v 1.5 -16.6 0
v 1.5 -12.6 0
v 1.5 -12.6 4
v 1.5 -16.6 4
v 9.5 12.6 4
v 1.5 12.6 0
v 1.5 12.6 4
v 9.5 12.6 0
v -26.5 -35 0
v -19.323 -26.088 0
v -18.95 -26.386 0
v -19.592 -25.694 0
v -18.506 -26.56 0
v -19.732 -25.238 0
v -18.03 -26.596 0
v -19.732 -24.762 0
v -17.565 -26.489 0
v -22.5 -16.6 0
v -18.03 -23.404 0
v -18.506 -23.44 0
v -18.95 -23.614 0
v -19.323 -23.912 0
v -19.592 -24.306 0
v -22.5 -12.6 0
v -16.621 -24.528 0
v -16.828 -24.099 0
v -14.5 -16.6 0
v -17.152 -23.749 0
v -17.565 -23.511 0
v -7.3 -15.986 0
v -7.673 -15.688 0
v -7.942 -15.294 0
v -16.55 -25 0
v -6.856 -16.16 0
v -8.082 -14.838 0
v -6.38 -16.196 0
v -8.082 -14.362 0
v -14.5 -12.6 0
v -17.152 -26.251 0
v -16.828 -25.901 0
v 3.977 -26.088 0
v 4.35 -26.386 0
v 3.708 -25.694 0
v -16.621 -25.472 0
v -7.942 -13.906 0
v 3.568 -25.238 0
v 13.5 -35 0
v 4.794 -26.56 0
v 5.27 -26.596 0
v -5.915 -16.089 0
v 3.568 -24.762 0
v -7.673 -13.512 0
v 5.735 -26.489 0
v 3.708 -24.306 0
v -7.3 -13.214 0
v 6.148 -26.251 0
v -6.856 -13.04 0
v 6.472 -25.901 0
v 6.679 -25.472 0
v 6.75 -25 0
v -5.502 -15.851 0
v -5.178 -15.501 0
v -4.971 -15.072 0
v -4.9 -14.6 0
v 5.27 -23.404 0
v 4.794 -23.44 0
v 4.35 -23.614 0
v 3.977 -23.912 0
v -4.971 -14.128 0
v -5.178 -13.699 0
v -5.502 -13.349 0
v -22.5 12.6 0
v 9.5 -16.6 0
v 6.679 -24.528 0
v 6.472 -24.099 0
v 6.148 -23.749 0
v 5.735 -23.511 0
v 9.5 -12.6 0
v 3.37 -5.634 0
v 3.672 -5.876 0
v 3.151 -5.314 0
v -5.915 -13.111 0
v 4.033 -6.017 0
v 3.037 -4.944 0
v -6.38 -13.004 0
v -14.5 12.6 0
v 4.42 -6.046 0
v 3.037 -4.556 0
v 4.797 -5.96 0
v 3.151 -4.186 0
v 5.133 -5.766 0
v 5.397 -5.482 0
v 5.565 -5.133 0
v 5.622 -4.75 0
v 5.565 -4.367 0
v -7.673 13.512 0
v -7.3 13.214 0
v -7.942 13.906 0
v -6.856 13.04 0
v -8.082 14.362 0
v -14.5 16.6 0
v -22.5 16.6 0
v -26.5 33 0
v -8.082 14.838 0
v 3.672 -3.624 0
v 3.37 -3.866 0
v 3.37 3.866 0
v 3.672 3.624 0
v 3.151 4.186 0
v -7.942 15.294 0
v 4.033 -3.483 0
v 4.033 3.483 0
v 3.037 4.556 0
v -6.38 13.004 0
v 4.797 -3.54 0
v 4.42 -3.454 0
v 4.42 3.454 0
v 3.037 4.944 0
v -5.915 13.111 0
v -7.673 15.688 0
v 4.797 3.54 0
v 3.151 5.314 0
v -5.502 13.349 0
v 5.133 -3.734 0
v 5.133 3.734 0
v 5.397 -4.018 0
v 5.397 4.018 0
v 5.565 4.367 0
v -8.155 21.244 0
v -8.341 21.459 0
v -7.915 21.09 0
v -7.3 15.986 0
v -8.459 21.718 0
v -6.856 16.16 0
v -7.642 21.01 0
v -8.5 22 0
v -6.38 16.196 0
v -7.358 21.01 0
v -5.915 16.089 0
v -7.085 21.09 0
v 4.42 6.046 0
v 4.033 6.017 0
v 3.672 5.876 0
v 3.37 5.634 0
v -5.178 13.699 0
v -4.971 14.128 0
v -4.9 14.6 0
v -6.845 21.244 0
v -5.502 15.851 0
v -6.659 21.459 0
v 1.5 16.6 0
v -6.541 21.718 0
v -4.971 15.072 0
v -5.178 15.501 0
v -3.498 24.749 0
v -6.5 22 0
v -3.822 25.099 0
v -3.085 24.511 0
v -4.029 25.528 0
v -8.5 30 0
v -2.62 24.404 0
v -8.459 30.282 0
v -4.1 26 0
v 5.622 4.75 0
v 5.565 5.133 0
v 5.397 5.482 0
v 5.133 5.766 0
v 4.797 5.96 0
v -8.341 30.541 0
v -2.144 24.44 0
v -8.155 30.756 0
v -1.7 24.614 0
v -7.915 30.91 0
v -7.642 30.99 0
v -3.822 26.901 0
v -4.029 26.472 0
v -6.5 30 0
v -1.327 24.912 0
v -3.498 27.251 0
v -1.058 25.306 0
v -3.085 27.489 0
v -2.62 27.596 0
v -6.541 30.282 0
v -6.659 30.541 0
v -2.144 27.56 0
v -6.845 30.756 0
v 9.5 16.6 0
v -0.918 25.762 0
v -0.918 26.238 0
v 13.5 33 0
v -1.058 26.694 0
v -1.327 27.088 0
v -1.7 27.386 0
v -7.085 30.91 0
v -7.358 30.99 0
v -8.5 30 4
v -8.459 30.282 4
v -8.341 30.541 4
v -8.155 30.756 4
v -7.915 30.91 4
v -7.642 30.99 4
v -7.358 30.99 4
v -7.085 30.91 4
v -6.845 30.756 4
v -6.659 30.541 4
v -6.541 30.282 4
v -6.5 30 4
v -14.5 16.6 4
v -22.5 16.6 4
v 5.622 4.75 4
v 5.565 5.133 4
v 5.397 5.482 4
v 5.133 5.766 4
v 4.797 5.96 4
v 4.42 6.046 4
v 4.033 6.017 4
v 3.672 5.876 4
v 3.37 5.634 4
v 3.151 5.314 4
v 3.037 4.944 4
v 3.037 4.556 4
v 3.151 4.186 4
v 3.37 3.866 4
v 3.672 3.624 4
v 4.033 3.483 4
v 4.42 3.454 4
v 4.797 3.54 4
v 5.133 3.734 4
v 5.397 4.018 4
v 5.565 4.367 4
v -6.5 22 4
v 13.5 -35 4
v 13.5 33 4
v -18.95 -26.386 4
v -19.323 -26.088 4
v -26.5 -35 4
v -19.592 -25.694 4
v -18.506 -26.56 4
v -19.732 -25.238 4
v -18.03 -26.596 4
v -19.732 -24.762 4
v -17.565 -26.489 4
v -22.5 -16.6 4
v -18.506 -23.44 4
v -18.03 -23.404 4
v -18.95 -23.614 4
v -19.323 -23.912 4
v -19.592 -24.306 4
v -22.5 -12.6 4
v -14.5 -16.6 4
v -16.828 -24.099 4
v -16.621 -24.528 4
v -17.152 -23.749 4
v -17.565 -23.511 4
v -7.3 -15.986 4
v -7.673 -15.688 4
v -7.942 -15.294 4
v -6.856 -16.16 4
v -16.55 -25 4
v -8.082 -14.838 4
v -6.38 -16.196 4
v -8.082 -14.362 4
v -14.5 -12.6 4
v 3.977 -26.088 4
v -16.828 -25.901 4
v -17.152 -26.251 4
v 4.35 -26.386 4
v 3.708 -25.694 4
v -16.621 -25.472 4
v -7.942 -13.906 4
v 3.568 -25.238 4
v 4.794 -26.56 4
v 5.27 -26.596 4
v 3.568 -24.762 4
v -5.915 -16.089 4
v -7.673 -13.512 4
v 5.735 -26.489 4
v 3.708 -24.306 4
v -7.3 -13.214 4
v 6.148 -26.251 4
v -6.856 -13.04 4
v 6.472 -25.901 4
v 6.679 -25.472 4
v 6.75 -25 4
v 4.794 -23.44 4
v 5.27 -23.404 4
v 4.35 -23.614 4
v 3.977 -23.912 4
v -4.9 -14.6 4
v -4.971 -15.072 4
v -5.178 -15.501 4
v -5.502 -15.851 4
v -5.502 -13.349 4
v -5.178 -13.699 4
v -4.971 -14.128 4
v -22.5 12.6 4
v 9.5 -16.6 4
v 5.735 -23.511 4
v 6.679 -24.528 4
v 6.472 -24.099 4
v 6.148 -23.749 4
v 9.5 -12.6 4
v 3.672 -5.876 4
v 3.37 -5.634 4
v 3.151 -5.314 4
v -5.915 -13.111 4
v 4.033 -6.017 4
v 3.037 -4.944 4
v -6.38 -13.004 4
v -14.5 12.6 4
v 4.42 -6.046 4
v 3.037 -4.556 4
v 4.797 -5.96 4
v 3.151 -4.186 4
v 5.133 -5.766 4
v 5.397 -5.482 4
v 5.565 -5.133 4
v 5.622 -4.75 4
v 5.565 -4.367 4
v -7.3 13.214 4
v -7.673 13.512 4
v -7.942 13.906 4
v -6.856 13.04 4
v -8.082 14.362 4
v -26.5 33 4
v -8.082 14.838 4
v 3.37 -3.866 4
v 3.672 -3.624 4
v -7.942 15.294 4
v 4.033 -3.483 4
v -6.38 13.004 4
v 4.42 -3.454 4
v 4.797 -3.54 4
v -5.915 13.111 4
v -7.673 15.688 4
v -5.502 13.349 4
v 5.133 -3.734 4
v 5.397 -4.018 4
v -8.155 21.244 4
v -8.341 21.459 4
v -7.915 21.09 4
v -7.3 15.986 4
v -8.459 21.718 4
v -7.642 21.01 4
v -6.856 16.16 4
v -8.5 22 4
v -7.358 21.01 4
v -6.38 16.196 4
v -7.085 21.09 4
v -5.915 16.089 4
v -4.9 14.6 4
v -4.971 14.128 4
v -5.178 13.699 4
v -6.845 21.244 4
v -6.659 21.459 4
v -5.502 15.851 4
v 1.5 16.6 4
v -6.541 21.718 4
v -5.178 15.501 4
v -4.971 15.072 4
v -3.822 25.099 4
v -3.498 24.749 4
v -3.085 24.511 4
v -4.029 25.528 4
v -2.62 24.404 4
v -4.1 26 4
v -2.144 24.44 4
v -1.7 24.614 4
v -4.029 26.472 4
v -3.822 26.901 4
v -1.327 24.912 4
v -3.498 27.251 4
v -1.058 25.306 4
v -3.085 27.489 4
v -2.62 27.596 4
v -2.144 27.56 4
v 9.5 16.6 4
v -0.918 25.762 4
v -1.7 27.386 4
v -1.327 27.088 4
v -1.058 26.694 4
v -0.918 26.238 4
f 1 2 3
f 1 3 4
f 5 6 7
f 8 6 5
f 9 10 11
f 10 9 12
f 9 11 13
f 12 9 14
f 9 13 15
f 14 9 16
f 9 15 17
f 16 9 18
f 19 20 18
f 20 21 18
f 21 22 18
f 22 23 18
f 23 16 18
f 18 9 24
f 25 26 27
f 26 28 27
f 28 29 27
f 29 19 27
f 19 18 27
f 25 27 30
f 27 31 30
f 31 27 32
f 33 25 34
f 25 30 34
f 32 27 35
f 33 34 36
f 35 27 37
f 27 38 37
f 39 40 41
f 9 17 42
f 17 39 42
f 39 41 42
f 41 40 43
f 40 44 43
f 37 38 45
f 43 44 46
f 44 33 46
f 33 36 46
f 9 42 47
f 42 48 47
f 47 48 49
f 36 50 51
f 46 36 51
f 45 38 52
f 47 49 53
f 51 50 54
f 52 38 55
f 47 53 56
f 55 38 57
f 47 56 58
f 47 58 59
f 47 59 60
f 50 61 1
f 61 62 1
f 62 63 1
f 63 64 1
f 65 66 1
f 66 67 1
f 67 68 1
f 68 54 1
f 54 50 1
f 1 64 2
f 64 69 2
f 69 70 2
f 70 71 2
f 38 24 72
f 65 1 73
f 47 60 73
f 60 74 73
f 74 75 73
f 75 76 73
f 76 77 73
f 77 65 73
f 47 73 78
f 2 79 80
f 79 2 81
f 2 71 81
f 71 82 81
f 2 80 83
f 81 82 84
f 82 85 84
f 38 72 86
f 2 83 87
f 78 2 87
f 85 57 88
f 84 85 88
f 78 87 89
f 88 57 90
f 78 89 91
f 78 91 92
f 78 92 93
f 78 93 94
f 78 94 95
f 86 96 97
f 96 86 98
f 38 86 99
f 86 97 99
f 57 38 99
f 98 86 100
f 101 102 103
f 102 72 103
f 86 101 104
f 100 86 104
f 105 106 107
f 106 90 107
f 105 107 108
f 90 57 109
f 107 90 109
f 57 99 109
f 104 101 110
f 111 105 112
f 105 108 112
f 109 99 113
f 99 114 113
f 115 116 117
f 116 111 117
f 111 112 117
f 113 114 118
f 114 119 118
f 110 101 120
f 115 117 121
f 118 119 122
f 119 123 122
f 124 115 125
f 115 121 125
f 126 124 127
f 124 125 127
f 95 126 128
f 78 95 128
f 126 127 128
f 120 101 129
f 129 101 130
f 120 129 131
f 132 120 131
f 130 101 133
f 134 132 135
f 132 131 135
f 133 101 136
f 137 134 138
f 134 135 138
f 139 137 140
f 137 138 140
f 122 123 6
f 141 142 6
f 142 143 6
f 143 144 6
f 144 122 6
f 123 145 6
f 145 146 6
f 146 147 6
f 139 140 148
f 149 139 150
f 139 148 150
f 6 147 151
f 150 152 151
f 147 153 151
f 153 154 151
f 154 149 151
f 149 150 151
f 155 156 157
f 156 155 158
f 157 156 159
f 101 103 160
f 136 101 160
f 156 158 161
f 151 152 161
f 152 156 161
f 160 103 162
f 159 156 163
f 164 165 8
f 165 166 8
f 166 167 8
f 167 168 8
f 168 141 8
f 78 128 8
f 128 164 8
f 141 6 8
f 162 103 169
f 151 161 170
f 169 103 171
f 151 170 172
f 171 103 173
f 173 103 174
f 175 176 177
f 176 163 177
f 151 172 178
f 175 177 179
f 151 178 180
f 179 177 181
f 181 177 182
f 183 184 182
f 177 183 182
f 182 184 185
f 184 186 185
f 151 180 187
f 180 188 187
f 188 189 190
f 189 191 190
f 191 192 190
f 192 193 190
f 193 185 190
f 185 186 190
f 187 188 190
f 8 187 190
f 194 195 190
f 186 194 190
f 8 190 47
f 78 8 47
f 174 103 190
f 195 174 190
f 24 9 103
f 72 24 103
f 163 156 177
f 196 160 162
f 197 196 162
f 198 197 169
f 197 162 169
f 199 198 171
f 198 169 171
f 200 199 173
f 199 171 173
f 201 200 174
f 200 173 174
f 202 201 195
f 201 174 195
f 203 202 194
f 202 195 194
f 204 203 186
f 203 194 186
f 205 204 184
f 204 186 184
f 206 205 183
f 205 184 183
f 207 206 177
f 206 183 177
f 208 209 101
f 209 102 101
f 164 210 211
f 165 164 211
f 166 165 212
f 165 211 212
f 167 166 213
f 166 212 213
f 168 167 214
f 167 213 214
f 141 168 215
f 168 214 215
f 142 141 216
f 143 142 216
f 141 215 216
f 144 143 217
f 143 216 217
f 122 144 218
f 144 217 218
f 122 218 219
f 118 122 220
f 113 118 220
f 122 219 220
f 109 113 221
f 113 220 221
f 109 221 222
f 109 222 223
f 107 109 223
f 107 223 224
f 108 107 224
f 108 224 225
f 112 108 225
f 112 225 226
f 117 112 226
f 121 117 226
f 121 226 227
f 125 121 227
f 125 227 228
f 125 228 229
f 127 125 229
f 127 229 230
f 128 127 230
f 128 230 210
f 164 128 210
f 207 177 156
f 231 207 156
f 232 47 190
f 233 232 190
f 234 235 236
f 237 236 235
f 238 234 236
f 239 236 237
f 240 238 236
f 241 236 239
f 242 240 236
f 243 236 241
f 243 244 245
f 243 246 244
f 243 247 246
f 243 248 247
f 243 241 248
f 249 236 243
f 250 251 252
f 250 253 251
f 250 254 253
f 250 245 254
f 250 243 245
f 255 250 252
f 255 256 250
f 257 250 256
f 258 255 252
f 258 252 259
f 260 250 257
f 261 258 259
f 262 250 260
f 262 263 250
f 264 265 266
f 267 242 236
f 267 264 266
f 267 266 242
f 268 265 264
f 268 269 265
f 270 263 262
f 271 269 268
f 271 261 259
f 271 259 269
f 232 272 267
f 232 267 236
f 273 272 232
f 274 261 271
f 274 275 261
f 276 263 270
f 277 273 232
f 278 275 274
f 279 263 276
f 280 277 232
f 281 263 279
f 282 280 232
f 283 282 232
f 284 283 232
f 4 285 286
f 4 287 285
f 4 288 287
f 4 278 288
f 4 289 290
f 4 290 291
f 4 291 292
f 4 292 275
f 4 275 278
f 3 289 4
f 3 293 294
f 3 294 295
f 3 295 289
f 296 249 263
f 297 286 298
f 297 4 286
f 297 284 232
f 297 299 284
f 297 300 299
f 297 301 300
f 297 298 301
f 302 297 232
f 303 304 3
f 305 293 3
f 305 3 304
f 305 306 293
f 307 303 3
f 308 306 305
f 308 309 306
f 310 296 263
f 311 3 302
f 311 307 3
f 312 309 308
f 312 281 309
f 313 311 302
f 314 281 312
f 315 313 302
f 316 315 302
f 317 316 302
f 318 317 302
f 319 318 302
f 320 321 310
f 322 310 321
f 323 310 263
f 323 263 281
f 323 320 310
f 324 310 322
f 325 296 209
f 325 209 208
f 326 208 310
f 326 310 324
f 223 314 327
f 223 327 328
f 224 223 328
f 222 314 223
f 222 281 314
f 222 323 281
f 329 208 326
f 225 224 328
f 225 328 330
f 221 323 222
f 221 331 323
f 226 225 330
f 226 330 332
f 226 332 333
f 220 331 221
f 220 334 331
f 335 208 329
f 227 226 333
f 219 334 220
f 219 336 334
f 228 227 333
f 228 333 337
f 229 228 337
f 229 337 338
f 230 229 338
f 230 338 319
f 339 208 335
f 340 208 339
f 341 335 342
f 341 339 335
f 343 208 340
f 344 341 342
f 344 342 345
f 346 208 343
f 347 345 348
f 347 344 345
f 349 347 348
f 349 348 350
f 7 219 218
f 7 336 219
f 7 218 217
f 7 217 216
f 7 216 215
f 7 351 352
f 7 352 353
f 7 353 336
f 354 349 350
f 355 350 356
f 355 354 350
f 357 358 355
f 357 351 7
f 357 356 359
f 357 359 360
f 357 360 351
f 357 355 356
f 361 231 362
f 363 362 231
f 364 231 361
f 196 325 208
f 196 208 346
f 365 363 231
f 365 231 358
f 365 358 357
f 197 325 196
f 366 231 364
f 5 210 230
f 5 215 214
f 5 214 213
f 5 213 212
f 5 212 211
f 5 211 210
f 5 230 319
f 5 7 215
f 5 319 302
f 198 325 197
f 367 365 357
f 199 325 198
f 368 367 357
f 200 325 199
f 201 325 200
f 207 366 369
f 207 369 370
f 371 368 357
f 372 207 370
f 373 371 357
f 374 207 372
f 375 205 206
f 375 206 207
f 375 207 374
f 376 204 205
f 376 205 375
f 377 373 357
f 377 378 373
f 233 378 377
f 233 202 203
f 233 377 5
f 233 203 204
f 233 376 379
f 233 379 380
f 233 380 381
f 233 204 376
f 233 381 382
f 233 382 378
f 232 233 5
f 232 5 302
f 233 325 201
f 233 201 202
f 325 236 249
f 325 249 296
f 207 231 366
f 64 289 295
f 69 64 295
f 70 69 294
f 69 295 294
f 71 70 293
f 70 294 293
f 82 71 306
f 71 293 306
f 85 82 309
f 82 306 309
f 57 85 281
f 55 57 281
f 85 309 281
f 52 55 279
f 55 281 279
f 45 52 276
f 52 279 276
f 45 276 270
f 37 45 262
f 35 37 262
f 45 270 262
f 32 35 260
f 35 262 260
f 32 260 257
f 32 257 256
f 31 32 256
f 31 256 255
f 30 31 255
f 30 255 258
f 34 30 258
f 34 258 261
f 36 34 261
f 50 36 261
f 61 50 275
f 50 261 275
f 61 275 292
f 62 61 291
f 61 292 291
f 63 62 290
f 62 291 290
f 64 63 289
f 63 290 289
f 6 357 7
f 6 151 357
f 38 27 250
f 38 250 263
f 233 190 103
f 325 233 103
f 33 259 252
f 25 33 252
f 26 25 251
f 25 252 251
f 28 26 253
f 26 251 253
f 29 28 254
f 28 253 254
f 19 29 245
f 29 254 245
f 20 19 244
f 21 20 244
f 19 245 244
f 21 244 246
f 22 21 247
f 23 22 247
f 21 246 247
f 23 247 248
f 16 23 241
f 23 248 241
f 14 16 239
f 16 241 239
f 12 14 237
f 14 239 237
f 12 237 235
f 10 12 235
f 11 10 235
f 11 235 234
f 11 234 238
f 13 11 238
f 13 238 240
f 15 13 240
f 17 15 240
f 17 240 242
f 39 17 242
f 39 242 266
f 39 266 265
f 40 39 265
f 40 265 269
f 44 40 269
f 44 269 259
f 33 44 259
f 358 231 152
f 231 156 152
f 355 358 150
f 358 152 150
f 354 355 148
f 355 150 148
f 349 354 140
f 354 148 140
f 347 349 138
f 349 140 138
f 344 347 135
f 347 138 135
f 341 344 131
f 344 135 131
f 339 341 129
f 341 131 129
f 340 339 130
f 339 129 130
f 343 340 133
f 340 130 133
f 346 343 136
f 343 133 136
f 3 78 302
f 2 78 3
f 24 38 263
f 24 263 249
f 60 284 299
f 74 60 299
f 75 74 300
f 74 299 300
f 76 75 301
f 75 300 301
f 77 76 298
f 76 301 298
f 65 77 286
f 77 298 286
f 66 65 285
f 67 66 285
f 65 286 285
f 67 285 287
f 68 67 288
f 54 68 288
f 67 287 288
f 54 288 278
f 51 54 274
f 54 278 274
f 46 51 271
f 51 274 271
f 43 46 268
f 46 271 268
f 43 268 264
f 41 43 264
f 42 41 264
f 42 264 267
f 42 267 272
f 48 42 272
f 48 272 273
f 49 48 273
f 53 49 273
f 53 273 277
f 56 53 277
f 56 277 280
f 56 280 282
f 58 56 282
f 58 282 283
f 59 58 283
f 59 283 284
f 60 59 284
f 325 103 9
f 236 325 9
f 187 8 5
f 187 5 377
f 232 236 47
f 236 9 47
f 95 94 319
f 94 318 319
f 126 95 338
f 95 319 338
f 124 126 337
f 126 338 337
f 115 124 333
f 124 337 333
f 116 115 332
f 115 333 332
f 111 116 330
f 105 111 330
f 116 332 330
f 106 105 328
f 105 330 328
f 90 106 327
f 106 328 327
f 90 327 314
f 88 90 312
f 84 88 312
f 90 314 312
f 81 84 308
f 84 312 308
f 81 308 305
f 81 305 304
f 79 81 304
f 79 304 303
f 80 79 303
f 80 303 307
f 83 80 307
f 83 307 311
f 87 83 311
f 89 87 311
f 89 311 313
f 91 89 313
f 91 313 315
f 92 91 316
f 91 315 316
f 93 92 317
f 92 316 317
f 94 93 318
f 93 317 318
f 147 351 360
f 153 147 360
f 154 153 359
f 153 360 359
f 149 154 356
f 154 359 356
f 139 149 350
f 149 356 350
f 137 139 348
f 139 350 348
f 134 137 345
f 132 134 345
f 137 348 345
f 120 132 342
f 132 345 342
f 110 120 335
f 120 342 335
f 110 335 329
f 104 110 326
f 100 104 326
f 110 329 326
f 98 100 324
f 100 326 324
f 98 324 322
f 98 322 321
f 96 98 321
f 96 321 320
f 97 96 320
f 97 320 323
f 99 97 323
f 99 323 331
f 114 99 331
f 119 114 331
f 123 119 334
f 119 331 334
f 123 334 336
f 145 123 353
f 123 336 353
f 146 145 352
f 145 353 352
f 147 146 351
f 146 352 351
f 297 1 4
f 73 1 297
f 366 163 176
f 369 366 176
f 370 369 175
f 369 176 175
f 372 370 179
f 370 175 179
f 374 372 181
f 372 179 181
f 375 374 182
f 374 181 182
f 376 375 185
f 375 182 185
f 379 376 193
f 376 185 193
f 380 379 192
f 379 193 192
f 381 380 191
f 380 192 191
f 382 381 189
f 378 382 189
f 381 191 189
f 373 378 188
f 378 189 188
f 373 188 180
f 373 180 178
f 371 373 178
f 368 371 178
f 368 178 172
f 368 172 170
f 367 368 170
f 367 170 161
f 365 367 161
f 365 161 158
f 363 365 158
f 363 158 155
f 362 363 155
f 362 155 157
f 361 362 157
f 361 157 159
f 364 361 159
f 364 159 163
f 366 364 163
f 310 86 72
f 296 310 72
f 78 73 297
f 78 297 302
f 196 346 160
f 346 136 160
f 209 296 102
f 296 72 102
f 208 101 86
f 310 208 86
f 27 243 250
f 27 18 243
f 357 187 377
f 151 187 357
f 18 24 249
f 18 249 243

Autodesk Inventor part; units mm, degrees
ref_plane "YZ Plane" through (0, 0, 0) normal (1, 0, 0) x (0, 1, 0)
ref_plane "XZ Plane" through (0, 0, 0) normal (0, 1, 0) x (-1, 0, 0)
ref_plane "XY Plane" through (0, 0, 0) normal (0, 0, 1) x (1, 0, 0)
sketch "Эскиз1" plane through (0, 0, 0) normal (0, 0, 1) x (1, 0, 0)
  line L0 (-26.5, -35) -> (13.5, -35)
  line L1 (13.5, -35) -> (13.5, 33)
  line L2 (13.5, 33) -> (-26.5, 33)
  line L3 (-26.5, 33) -> (-26.5, -35)
  line L4 (-22.5, -16.6) -> (-14.5, -16.6)
  line L5 (-14.5, -16.6) -> (-14.5, -12.6)
  line L6 (-14.5, -12.6) -> (-22.5, -12.6)
  line L7 (-22.5, -12.6) -> (-22.5, -16.6)
  line L8 (1.5, -16.6) -> (9.5, -16.6)
  line L9 (9.5, -16.6) -> (9.5, -12.6)
  line L10 (9.5, -12.6) -> (1.5, -12.6)
  line L11 (1.5, -12.6) -> (1.5, -16.6)
  line L12 (-22.5, 16.6) -> (-14.5, 16.6)
  line L13 (-14.5, 16.6) -> (-14.5, 12.6)
  line L14 (-14.5, 12.6) -> (-22.5, 12.6)
  line L15 (-22.5, 12.6) -> (-22.5, 16.6)
  line L16 (1.5, 12.6) -> (9.5, 12.6)
  line L17 (9.5, 12.6) -> (9.5, 16.6)
  line L18 (9.5, 16.6) -> (1.5, 16.6)
  line L19 (1.5, 16.6) -> (1.5, 12.6)
  line L20 (-18.5, -12.6) -> (-18.5, -3.7782) construction
  line L21 (5.5, -12.6) -> (5.5, -5.4201) construction
  point P0 (0, 0)
  point P1 (-14.5, -14.6)
  point P2 (1.5, -14.6)
  point P3 (5.5, 12.6)
  point P4 (-18.5, 12.6)
  dimension "d0" = 68
  dimension "d1" = 40
  dimension "d2" = 8
  dimension "d3" = 4
  dimension "d5" = 4
  dimension "d10" = 8
  dimension "d12" = 4
  dimension "d13" = 16
  dimension "d32" = 8
  dimension "d33" = 4
  dimension "d34" = 8
  dimension "d35" = 25.2
  dimension "d54" = 16.4
  dimension "d55" = 25.2
extrude "Выдавливание1" add sketch "Эскиз1" along normal blind 4
sketch "Эскиз3" plane through (0, 0, 4) normal (0, 0, 1) x (1, 0, 0)
  line L0 (1.5, -16.6) -> (1.5, -12.6) projected
  line L1 (-14.5, -12.6) -> (-14.5, -16.6) projected
  circle A0 centre (-6.5, 14.6) radius 1.6
  circle A1 centre (-6.5, -14.6) radius 1.6
  line L2 (-14.5, 14.6) -> (1.5, 14.6)
  line L3 (-14.5, -14.6) -> (1.5, -14.6)
  line L4 (-14.5, 16.6) -> (-14.5, 12.6) projected
  line L5 (1.5, 12.6) -> (1.5, 16.6) projected
  point P0 (0, 0)
  point P1 (-14.5, 14.6)
  point P2 (1.5, 14.6)
  dimension "d27" = 3.2
  dimension "d28" = 3.2
extrude "Выдавливание3" cut sketch "Эскиз3" against normal blind 4
sketch "Эскиз4" plane through (0, 0, 0) normal (0, 0, -1) x (-1, 0, 0)
  line L0 (-25.5, 33) -> (9.5, 33) construction
  line L1 (9.5, 33) -> (9.5, 19) construction
  line L2 (9.5, 19) -> (-25.5, 19) construction
  line L3 (-25.5, 19) -> (-25.5, 33) construction
  line L4 (-13.5, 33) -> (26.5, 33) projected
  line L5 (-13.5, -35) -> (-13.5, 33) projected
  circle A0 centre (2.5, 26) radius 1.6
  line L6 (7.5, 21) -> (7.5, 31) construction
  line L7 (8.5, 22) -> (8.5, 30)
  line L8 (6.5, 30) -> (6.5, 22)
  arc A1 (6.5, 22) -> (8.5, 22) centre (7.5, 22) ccw
  arc A2 (8.5, 30) -> (6.5, 30) centre (7.5, 30) ccw
  line L9 (9.5, 26) -> (-1.5724, 26)
  point P0 (0, 0)
  point P1 (-8, 33)
  point P2 (-25.5, 26)
  point P3 (7.5, 26)
  dimension "d39" = 35
  dimension "d40" = 14
  dimension "d41" = 12
  dimension "d42" = 3.2
  dimension "d43" = 7
  dimension "d44" = 10
  dimension "d45" = 2
  dimension "d46" = 5
extrude "Выдавливание4" cut sketch "Эскиз4" against normal blind 4
sketch "Эскиз5" plane through (0, 0, 4) normal (0, 0, 1) x (1, 0, 0)
  line L0 (4.3225, 4.75) -> (4.3225, -4.75)
  line L1 (0, 0) -> (13.5, 0) construction
  line L2 (13.5, -35) -> (13.5, 33) construction
  circle A0 centre (4.3225, 4.75) radius 1.3
  circle A1 centre (4.3225, -4.75) radius 1.3
  point P0 (4.3225, 0)
  dimension "d49" = 9.5
  dimension "d50" = 2.6
  dimension "d51" = 2.6
extrude "Выдавливание5" cut sketch "Эскиз5" against normal blind 4
sketch "Эскиз7" plane through (0, 0, 4) normal (0, 0, 1) x (1, 0, 0)
  line L0 (23.5, -19) -> (23.5, -23) construction
  line L1 (-19.8, -23) -> (-19.8, -27) construction
  line L2 (-19.8, -27) -> (-36.5, -27) construction
  line L3 (-36.5, -27) -> (-36.5, -23) construction
  line L4 (-36.5, -23) -> (-19.8, -23) construction
  line L5 (3.5, -23) -> (3.5, -27) construction
  line L6 (3.5, -27) -> (-16.5, -27) construction
  line L7 (-16.5, -27) -> (-16.5, -23) construction
  line L8 (-16.5, -23) -> (3.5, -23) construction
  line L9 (6.8, -27) -> (6.8, -23) construction
  line L10 (6.8, -23) -> (23.5, -23) construction
  line L11 (23.5, -23) -> (23.5, -27) construction
  line L12 (23.5, -27) -> (6.8, -27) construction
  line L13 (-19.8, -27) -> (-16.5, -23) construction
  line L14 (3.5, -27) -> (6.8, -23) construction
  circle A0 centre (-18.15, -25) radius 1.6
  circle A1 centre (5.15, -25) radius 1.6
  dimension "d60" = 3.2
  dimension "d61" = 3.2
extrude "Выдавливание6" cut sketch "Эскиз7" against normal blind 10
properties part number "дно_каретки"
